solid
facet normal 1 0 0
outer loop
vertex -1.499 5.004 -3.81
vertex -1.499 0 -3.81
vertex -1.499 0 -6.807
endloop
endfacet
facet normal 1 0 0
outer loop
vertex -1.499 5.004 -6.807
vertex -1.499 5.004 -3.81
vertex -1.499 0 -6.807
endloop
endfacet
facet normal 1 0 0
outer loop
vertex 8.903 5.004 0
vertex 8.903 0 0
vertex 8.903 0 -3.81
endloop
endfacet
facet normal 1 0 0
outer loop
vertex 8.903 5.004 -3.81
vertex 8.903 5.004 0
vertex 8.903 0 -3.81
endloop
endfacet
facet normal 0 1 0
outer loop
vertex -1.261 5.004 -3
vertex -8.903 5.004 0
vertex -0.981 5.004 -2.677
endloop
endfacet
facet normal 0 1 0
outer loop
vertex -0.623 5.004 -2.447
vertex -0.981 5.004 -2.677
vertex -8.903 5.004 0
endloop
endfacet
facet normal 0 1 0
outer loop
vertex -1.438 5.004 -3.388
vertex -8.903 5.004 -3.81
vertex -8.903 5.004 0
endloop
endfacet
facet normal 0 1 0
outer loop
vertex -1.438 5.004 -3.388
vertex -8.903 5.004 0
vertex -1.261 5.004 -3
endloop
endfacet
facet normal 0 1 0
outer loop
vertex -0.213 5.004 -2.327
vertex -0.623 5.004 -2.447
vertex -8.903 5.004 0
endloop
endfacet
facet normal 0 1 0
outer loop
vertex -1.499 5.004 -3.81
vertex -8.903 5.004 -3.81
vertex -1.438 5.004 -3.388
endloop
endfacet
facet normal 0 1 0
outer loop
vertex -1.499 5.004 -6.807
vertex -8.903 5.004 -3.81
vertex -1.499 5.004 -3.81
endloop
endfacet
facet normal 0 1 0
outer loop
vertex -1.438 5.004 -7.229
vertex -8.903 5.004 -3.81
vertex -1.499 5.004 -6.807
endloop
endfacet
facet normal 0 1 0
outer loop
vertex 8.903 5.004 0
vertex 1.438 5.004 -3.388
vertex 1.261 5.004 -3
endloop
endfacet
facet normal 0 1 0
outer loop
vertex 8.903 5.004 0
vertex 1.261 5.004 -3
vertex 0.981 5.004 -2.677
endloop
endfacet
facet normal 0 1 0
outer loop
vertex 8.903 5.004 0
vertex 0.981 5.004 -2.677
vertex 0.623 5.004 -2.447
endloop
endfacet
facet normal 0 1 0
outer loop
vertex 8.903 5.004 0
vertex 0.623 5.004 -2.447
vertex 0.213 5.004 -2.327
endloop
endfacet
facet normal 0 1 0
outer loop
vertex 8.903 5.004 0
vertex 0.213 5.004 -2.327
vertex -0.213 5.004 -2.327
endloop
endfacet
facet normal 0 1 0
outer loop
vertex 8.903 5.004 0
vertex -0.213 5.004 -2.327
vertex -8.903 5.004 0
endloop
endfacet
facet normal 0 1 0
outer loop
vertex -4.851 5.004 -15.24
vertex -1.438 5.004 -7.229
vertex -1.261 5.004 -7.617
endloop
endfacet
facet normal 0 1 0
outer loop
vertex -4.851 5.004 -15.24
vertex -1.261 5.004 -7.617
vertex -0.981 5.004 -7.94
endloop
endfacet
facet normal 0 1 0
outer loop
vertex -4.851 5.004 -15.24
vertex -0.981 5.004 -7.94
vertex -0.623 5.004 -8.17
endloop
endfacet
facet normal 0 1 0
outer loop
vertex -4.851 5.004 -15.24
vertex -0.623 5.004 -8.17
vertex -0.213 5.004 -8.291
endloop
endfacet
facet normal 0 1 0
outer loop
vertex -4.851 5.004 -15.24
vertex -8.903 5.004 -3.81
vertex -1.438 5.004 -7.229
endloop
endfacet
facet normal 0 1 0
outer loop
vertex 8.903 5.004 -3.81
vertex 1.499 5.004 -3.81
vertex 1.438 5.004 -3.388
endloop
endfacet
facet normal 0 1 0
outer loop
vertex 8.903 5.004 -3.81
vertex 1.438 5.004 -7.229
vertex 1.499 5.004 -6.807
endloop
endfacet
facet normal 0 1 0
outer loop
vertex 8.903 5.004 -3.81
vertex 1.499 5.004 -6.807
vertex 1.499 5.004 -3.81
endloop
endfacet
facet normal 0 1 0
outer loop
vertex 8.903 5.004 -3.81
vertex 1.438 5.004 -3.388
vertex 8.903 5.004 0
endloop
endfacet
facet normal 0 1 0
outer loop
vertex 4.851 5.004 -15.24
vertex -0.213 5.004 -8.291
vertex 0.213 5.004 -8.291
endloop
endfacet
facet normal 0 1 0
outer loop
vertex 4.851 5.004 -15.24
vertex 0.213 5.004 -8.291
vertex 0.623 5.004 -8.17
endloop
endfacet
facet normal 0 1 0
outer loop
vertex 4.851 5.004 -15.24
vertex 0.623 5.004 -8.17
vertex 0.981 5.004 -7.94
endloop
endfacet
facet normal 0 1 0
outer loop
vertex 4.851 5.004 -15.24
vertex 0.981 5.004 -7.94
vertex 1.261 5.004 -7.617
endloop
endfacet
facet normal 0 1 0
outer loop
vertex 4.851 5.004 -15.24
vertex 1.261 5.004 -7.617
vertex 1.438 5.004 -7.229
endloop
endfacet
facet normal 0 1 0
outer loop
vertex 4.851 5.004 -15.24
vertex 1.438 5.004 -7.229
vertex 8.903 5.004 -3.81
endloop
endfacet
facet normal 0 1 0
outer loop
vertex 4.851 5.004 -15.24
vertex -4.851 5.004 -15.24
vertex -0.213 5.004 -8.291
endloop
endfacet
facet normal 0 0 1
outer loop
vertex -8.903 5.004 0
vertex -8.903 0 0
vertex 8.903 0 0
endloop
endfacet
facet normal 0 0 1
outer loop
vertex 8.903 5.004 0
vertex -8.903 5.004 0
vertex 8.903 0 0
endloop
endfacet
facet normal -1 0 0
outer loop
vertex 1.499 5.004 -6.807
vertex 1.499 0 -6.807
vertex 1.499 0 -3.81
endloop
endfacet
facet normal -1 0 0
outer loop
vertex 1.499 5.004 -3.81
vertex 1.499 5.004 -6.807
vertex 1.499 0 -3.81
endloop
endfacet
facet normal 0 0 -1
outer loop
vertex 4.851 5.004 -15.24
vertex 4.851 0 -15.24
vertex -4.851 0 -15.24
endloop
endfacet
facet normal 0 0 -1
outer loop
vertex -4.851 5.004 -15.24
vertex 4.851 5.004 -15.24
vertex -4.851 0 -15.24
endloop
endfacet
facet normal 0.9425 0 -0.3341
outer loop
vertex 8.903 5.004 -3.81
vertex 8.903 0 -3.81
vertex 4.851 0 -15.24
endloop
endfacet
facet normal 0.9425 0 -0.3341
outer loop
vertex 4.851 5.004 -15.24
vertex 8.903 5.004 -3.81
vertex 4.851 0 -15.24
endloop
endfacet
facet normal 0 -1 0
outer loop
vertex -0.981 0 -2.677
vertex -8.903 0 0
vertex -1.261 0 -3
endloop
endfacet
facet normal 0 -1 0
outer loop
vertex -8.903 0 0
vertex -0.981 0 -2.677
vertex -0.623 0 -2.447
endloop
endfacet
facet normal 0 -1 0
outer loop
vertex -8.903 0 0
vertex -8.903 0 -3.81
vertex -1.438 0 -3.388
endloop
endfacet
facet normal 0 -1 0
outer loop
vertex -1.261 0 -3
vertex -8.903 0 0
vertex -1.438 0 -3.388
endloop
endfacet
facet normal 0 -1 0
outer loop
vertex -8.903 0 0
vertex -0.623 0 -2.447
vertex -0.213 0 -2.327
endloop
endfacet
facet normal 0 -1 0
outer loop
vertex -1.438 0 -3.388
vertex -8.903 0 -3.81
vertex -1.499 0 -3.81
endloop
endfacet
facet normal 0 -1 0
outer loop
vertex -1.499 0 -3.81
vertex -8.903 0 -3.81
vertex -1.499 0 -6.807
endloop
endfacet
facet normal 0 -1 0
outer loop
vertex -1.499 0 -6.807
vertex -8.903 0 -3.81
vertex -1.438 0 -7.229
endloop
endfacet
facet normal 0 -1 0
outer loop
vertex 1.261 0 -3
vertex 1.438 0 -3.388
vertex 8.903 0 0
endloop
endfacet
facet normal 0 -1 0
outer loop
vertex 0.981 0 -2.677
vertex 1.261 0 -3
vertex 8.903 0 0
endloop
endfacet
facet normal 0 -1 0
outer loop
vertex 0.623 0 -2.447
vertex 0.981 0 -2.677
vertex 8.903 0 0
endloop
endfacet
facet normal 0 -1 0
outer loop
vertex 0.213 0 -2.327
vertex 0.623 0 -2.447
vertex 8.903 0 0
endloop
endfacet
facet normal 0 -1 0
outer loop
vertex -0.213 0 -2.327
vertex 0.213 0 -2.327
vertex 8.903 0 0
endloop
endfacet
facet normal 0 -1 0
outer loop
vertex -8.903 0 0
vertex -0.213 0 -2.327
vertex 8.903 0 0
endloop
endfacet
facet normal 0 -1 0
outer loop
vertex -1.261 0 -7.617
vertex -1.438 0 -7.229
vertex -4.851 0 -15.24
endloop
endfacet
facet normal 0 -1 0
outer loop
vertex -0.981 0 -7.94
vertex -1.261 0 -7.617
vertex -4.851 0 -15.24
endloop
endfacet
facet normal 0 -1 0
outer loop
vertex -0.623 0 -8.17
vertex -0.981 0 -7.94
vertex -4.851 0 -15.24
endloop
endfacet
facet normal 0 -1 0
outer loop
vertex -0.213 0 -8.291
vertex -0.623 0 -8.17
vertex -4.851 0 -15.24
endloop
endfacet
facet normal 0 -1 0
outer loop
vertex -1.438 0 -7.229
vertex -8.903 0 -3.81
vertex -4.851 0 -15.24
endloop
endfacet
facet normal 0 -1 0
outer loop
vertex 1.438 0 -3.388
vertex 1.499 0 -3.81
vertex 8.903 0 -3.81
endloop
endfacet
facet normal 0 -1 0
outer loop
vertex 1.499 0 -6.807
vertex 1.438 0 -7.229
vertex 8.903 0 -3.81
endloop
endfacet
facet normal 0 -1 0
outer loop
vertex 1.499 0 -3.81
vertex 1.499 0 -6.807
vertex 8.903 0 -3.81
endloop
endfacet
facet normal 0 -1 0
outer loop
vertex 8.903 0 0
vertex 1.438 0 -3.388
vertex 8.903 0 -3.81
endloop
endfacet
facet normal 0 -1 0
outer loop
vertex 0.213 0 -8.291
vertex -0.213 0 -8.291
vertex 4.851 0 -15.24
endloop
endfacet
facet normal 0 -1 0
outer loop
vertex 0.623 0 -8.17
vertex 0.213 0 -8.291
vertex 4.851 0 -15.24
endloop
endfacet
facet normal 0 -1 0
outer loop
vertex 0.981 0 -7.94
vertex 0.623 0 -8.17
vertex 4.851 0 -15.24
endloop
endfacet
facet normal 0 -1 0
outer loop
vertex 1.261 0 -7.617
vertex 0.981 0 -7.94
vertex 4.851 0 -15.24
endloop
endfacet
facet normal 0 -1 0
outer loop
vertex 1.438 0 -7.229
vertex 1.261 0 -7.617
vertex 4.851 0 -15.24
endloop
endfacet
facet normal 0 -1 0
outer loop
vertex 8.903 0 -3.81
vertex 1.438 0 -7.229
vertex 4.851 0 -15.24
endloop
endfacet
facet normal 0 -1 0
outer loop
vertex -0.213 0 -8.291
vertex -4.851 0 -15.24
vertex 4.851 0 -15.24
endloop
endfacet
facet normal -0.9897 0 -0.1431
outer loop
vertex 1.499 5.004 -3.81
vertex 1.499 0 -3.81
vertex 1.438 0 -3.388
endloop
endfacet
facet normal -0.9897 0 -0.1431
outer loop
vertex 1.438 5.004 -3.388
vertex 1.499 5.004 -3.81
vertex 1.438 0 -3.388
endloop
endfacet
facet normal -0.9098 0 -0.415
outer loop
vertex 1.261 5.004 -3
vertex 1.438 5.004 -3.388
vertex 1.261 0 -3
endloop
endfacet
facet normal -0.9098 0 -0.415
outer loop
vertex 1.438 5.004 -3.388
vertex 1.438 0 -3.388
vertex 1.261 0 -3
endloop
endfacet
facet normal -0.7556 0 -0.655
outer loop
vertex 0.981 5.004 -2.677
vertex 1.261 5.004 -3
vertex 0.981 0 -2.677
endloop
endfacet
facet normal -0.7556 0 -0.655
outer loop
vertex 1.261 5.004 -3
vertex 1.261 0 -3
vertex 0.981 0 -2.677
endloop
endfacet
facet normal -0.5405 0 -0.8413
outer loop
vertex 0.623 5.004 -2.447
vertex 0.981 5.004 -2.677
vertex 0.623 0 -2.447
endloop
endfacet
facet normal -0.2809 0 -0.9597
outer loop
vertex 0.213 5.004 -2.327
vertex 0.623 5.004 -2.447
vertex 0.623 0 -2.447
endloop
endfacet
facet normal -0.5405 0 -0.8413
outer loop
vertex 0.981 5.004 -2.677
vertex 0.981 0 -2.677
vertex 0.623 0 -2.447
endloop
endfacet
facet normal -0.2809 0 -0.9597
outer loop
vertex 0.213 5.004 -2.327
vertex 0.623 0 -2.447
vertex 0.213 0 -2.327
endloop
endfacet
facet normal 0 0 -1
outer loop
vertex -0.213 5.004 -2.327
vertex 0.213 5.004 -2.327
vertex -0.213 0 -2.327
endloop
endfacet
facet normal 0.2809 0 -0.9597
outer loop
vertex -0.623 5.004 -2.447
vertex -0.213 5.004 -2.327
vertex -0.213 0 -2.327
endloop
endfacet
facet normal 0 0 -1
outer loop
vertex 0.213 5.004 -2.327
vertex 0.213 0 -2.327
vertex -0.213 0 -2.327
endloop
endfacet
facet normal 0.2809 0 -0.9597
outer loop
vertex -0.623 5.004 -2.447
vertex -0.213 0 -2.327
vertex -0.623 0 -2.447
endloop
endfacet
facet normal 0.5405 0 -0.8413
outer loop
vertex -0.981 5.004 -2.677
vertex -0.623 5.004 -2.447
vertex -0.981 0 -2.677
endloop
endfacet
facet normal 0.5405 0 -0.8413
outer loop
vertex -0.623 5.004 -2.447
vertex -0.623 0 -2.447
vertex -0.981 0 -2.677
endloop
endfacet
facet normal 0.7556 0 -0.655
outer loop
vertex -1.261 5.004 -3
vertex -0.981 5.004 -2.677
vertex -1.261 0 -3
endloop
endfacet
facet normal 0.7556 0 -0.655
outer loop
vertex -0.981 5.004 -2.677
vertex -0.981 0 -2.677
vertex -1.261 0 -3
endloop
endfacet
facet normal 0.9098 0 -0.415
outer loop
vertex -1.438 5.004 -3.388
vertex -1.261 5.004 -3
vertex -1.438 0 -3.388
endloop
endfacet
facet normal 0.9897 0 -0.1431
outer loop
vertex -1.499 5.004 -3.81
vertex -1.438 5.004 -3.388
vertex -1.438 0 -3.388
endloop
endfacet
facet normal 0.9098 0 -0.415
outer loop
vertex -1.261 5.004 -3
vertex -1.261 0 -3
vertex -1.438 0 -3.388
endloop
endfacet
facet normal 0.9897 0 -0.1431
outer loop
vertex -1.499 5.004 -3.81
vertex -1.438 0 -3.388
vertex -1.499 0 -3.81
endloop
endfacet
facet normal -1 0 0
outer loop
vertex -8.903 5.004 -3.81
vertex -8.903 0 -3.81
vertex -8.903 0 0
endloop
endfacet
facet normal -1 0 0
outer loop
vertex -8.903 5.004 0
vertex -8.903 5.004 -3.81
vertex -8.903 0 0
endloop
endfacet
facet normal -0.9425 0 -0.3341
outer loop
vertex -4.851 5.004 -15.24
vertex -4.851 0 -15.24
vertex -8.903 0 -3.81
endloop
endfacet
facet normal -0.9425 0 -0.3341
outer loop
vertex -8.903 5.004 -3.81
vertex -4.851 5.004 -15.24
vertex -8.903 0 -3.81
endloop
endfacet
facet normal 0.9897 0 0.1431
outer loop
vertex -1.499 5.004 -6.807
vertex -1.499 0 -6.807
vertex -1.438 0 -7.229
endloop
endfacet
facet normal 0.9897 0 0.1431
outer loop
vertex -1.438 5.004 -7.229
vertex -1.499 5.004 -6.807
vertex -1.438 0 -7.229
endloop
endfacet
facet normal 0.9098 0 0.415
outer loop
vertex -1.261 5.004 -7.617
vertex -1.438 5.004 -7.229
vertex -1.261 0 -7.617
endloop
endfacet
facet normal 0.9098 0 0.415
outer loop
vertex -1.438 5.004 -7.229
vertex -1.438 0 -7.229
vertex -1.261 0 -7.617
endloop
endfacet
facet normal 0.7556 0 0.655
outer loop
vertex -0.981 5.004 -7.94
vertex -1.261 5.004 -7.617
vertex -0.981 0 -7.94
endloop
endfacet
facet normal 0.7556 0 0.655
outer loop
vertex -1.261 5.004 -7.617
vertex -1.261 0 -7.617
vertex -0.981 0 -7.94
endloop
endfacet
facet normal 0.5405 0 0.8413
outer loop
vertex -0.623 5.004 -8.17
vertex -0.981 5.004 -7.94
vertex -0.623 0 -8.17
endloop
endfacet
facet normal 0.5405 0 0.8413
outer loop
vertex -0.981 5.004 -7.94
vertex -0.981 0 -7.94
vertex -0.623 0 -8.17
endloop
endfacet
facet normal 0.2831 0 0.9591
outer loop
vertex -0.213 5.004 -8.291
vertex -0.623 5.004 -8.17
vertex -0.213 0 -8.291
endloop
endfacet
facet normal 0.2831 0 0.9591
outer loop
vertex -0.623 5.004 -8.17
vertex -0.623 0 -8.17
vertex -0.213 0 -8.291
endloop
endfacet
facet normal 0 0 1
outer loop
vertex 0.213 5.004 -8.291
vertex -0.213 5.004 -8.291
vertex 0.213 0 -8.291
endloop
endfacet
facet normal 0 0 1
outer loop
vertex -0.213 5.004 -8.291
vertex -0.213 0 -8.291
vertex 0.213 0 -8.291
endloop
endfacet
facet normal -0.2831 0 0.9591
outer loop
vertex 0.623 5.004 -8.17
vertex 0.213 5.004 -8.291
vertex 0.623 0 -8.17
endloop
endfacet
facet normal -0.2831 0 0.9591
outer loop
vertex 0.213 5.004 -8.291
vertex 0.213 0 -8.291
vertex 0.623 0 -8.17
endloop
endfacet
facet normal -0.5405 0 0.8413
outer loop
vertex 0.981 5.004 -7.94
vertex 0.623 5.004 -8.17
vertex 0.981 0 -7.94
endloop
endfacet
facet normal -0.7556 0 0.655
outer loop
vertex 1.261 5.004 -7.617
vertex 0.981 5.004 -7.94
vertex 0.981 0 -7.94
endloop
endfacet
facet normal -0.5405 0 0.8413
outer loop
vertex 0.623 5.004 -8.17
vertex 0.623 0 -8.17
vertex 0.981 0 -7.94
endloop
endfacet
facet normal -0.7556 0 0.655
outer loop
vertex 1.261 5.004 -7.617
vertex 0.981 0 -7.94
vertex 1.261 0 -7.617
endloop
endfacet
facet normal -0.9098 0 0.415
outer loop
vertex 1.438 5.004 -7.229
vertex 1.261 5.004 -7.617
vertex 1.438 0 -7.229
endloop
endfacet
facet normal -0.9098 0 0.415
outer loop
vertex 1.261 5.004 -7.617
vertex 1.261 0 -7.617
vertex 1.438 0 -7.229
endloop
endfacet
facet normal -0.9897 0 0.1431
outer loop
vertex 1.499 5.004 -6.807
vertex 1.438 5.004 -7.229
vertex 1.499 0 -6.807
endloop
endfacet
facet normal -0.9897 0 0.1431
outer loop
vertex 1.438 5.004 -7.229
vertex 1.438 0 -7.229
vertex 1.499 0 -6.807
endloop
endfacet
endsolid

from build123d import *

# Parameters (mm, degrees)
BOSS_EXTRUDE1_DEPTH = 5.0038


with BuildPart() as part:
    # Sketch1 → Boss-Extrude1 (new body)
    with BuildSketch(Plane(origin=(0, 0, 0), x_dir=(1, 0, 0), z_dir=(0, 1, 0))):
        Polygon((-8.9027, 0), (8.9027, 0), (8.9027, 3.81), (4.8514, 15.24), (-4.8514, 15.24), (-8.9027, 3.81), align=None)
        with BuildLine():
            Line((-1.4986, 3.81), (-1.4986, 6.8072))
            ThreePointArc((-1.4986, 6.8072), (0, 8.3058), (1.4986, 6.8072))
            Line((1.4986, 6.8072), (1.4986, 3.81))
            ThreePointArc((1.4986, 3.81), (0, 2.3114), (-1.4986, 3.81))
        make_face(mode=Mode.SUBTRACT)
    extrude(amount=BOSS_EXTRUDE1_DEPTH)


solid = part.part
